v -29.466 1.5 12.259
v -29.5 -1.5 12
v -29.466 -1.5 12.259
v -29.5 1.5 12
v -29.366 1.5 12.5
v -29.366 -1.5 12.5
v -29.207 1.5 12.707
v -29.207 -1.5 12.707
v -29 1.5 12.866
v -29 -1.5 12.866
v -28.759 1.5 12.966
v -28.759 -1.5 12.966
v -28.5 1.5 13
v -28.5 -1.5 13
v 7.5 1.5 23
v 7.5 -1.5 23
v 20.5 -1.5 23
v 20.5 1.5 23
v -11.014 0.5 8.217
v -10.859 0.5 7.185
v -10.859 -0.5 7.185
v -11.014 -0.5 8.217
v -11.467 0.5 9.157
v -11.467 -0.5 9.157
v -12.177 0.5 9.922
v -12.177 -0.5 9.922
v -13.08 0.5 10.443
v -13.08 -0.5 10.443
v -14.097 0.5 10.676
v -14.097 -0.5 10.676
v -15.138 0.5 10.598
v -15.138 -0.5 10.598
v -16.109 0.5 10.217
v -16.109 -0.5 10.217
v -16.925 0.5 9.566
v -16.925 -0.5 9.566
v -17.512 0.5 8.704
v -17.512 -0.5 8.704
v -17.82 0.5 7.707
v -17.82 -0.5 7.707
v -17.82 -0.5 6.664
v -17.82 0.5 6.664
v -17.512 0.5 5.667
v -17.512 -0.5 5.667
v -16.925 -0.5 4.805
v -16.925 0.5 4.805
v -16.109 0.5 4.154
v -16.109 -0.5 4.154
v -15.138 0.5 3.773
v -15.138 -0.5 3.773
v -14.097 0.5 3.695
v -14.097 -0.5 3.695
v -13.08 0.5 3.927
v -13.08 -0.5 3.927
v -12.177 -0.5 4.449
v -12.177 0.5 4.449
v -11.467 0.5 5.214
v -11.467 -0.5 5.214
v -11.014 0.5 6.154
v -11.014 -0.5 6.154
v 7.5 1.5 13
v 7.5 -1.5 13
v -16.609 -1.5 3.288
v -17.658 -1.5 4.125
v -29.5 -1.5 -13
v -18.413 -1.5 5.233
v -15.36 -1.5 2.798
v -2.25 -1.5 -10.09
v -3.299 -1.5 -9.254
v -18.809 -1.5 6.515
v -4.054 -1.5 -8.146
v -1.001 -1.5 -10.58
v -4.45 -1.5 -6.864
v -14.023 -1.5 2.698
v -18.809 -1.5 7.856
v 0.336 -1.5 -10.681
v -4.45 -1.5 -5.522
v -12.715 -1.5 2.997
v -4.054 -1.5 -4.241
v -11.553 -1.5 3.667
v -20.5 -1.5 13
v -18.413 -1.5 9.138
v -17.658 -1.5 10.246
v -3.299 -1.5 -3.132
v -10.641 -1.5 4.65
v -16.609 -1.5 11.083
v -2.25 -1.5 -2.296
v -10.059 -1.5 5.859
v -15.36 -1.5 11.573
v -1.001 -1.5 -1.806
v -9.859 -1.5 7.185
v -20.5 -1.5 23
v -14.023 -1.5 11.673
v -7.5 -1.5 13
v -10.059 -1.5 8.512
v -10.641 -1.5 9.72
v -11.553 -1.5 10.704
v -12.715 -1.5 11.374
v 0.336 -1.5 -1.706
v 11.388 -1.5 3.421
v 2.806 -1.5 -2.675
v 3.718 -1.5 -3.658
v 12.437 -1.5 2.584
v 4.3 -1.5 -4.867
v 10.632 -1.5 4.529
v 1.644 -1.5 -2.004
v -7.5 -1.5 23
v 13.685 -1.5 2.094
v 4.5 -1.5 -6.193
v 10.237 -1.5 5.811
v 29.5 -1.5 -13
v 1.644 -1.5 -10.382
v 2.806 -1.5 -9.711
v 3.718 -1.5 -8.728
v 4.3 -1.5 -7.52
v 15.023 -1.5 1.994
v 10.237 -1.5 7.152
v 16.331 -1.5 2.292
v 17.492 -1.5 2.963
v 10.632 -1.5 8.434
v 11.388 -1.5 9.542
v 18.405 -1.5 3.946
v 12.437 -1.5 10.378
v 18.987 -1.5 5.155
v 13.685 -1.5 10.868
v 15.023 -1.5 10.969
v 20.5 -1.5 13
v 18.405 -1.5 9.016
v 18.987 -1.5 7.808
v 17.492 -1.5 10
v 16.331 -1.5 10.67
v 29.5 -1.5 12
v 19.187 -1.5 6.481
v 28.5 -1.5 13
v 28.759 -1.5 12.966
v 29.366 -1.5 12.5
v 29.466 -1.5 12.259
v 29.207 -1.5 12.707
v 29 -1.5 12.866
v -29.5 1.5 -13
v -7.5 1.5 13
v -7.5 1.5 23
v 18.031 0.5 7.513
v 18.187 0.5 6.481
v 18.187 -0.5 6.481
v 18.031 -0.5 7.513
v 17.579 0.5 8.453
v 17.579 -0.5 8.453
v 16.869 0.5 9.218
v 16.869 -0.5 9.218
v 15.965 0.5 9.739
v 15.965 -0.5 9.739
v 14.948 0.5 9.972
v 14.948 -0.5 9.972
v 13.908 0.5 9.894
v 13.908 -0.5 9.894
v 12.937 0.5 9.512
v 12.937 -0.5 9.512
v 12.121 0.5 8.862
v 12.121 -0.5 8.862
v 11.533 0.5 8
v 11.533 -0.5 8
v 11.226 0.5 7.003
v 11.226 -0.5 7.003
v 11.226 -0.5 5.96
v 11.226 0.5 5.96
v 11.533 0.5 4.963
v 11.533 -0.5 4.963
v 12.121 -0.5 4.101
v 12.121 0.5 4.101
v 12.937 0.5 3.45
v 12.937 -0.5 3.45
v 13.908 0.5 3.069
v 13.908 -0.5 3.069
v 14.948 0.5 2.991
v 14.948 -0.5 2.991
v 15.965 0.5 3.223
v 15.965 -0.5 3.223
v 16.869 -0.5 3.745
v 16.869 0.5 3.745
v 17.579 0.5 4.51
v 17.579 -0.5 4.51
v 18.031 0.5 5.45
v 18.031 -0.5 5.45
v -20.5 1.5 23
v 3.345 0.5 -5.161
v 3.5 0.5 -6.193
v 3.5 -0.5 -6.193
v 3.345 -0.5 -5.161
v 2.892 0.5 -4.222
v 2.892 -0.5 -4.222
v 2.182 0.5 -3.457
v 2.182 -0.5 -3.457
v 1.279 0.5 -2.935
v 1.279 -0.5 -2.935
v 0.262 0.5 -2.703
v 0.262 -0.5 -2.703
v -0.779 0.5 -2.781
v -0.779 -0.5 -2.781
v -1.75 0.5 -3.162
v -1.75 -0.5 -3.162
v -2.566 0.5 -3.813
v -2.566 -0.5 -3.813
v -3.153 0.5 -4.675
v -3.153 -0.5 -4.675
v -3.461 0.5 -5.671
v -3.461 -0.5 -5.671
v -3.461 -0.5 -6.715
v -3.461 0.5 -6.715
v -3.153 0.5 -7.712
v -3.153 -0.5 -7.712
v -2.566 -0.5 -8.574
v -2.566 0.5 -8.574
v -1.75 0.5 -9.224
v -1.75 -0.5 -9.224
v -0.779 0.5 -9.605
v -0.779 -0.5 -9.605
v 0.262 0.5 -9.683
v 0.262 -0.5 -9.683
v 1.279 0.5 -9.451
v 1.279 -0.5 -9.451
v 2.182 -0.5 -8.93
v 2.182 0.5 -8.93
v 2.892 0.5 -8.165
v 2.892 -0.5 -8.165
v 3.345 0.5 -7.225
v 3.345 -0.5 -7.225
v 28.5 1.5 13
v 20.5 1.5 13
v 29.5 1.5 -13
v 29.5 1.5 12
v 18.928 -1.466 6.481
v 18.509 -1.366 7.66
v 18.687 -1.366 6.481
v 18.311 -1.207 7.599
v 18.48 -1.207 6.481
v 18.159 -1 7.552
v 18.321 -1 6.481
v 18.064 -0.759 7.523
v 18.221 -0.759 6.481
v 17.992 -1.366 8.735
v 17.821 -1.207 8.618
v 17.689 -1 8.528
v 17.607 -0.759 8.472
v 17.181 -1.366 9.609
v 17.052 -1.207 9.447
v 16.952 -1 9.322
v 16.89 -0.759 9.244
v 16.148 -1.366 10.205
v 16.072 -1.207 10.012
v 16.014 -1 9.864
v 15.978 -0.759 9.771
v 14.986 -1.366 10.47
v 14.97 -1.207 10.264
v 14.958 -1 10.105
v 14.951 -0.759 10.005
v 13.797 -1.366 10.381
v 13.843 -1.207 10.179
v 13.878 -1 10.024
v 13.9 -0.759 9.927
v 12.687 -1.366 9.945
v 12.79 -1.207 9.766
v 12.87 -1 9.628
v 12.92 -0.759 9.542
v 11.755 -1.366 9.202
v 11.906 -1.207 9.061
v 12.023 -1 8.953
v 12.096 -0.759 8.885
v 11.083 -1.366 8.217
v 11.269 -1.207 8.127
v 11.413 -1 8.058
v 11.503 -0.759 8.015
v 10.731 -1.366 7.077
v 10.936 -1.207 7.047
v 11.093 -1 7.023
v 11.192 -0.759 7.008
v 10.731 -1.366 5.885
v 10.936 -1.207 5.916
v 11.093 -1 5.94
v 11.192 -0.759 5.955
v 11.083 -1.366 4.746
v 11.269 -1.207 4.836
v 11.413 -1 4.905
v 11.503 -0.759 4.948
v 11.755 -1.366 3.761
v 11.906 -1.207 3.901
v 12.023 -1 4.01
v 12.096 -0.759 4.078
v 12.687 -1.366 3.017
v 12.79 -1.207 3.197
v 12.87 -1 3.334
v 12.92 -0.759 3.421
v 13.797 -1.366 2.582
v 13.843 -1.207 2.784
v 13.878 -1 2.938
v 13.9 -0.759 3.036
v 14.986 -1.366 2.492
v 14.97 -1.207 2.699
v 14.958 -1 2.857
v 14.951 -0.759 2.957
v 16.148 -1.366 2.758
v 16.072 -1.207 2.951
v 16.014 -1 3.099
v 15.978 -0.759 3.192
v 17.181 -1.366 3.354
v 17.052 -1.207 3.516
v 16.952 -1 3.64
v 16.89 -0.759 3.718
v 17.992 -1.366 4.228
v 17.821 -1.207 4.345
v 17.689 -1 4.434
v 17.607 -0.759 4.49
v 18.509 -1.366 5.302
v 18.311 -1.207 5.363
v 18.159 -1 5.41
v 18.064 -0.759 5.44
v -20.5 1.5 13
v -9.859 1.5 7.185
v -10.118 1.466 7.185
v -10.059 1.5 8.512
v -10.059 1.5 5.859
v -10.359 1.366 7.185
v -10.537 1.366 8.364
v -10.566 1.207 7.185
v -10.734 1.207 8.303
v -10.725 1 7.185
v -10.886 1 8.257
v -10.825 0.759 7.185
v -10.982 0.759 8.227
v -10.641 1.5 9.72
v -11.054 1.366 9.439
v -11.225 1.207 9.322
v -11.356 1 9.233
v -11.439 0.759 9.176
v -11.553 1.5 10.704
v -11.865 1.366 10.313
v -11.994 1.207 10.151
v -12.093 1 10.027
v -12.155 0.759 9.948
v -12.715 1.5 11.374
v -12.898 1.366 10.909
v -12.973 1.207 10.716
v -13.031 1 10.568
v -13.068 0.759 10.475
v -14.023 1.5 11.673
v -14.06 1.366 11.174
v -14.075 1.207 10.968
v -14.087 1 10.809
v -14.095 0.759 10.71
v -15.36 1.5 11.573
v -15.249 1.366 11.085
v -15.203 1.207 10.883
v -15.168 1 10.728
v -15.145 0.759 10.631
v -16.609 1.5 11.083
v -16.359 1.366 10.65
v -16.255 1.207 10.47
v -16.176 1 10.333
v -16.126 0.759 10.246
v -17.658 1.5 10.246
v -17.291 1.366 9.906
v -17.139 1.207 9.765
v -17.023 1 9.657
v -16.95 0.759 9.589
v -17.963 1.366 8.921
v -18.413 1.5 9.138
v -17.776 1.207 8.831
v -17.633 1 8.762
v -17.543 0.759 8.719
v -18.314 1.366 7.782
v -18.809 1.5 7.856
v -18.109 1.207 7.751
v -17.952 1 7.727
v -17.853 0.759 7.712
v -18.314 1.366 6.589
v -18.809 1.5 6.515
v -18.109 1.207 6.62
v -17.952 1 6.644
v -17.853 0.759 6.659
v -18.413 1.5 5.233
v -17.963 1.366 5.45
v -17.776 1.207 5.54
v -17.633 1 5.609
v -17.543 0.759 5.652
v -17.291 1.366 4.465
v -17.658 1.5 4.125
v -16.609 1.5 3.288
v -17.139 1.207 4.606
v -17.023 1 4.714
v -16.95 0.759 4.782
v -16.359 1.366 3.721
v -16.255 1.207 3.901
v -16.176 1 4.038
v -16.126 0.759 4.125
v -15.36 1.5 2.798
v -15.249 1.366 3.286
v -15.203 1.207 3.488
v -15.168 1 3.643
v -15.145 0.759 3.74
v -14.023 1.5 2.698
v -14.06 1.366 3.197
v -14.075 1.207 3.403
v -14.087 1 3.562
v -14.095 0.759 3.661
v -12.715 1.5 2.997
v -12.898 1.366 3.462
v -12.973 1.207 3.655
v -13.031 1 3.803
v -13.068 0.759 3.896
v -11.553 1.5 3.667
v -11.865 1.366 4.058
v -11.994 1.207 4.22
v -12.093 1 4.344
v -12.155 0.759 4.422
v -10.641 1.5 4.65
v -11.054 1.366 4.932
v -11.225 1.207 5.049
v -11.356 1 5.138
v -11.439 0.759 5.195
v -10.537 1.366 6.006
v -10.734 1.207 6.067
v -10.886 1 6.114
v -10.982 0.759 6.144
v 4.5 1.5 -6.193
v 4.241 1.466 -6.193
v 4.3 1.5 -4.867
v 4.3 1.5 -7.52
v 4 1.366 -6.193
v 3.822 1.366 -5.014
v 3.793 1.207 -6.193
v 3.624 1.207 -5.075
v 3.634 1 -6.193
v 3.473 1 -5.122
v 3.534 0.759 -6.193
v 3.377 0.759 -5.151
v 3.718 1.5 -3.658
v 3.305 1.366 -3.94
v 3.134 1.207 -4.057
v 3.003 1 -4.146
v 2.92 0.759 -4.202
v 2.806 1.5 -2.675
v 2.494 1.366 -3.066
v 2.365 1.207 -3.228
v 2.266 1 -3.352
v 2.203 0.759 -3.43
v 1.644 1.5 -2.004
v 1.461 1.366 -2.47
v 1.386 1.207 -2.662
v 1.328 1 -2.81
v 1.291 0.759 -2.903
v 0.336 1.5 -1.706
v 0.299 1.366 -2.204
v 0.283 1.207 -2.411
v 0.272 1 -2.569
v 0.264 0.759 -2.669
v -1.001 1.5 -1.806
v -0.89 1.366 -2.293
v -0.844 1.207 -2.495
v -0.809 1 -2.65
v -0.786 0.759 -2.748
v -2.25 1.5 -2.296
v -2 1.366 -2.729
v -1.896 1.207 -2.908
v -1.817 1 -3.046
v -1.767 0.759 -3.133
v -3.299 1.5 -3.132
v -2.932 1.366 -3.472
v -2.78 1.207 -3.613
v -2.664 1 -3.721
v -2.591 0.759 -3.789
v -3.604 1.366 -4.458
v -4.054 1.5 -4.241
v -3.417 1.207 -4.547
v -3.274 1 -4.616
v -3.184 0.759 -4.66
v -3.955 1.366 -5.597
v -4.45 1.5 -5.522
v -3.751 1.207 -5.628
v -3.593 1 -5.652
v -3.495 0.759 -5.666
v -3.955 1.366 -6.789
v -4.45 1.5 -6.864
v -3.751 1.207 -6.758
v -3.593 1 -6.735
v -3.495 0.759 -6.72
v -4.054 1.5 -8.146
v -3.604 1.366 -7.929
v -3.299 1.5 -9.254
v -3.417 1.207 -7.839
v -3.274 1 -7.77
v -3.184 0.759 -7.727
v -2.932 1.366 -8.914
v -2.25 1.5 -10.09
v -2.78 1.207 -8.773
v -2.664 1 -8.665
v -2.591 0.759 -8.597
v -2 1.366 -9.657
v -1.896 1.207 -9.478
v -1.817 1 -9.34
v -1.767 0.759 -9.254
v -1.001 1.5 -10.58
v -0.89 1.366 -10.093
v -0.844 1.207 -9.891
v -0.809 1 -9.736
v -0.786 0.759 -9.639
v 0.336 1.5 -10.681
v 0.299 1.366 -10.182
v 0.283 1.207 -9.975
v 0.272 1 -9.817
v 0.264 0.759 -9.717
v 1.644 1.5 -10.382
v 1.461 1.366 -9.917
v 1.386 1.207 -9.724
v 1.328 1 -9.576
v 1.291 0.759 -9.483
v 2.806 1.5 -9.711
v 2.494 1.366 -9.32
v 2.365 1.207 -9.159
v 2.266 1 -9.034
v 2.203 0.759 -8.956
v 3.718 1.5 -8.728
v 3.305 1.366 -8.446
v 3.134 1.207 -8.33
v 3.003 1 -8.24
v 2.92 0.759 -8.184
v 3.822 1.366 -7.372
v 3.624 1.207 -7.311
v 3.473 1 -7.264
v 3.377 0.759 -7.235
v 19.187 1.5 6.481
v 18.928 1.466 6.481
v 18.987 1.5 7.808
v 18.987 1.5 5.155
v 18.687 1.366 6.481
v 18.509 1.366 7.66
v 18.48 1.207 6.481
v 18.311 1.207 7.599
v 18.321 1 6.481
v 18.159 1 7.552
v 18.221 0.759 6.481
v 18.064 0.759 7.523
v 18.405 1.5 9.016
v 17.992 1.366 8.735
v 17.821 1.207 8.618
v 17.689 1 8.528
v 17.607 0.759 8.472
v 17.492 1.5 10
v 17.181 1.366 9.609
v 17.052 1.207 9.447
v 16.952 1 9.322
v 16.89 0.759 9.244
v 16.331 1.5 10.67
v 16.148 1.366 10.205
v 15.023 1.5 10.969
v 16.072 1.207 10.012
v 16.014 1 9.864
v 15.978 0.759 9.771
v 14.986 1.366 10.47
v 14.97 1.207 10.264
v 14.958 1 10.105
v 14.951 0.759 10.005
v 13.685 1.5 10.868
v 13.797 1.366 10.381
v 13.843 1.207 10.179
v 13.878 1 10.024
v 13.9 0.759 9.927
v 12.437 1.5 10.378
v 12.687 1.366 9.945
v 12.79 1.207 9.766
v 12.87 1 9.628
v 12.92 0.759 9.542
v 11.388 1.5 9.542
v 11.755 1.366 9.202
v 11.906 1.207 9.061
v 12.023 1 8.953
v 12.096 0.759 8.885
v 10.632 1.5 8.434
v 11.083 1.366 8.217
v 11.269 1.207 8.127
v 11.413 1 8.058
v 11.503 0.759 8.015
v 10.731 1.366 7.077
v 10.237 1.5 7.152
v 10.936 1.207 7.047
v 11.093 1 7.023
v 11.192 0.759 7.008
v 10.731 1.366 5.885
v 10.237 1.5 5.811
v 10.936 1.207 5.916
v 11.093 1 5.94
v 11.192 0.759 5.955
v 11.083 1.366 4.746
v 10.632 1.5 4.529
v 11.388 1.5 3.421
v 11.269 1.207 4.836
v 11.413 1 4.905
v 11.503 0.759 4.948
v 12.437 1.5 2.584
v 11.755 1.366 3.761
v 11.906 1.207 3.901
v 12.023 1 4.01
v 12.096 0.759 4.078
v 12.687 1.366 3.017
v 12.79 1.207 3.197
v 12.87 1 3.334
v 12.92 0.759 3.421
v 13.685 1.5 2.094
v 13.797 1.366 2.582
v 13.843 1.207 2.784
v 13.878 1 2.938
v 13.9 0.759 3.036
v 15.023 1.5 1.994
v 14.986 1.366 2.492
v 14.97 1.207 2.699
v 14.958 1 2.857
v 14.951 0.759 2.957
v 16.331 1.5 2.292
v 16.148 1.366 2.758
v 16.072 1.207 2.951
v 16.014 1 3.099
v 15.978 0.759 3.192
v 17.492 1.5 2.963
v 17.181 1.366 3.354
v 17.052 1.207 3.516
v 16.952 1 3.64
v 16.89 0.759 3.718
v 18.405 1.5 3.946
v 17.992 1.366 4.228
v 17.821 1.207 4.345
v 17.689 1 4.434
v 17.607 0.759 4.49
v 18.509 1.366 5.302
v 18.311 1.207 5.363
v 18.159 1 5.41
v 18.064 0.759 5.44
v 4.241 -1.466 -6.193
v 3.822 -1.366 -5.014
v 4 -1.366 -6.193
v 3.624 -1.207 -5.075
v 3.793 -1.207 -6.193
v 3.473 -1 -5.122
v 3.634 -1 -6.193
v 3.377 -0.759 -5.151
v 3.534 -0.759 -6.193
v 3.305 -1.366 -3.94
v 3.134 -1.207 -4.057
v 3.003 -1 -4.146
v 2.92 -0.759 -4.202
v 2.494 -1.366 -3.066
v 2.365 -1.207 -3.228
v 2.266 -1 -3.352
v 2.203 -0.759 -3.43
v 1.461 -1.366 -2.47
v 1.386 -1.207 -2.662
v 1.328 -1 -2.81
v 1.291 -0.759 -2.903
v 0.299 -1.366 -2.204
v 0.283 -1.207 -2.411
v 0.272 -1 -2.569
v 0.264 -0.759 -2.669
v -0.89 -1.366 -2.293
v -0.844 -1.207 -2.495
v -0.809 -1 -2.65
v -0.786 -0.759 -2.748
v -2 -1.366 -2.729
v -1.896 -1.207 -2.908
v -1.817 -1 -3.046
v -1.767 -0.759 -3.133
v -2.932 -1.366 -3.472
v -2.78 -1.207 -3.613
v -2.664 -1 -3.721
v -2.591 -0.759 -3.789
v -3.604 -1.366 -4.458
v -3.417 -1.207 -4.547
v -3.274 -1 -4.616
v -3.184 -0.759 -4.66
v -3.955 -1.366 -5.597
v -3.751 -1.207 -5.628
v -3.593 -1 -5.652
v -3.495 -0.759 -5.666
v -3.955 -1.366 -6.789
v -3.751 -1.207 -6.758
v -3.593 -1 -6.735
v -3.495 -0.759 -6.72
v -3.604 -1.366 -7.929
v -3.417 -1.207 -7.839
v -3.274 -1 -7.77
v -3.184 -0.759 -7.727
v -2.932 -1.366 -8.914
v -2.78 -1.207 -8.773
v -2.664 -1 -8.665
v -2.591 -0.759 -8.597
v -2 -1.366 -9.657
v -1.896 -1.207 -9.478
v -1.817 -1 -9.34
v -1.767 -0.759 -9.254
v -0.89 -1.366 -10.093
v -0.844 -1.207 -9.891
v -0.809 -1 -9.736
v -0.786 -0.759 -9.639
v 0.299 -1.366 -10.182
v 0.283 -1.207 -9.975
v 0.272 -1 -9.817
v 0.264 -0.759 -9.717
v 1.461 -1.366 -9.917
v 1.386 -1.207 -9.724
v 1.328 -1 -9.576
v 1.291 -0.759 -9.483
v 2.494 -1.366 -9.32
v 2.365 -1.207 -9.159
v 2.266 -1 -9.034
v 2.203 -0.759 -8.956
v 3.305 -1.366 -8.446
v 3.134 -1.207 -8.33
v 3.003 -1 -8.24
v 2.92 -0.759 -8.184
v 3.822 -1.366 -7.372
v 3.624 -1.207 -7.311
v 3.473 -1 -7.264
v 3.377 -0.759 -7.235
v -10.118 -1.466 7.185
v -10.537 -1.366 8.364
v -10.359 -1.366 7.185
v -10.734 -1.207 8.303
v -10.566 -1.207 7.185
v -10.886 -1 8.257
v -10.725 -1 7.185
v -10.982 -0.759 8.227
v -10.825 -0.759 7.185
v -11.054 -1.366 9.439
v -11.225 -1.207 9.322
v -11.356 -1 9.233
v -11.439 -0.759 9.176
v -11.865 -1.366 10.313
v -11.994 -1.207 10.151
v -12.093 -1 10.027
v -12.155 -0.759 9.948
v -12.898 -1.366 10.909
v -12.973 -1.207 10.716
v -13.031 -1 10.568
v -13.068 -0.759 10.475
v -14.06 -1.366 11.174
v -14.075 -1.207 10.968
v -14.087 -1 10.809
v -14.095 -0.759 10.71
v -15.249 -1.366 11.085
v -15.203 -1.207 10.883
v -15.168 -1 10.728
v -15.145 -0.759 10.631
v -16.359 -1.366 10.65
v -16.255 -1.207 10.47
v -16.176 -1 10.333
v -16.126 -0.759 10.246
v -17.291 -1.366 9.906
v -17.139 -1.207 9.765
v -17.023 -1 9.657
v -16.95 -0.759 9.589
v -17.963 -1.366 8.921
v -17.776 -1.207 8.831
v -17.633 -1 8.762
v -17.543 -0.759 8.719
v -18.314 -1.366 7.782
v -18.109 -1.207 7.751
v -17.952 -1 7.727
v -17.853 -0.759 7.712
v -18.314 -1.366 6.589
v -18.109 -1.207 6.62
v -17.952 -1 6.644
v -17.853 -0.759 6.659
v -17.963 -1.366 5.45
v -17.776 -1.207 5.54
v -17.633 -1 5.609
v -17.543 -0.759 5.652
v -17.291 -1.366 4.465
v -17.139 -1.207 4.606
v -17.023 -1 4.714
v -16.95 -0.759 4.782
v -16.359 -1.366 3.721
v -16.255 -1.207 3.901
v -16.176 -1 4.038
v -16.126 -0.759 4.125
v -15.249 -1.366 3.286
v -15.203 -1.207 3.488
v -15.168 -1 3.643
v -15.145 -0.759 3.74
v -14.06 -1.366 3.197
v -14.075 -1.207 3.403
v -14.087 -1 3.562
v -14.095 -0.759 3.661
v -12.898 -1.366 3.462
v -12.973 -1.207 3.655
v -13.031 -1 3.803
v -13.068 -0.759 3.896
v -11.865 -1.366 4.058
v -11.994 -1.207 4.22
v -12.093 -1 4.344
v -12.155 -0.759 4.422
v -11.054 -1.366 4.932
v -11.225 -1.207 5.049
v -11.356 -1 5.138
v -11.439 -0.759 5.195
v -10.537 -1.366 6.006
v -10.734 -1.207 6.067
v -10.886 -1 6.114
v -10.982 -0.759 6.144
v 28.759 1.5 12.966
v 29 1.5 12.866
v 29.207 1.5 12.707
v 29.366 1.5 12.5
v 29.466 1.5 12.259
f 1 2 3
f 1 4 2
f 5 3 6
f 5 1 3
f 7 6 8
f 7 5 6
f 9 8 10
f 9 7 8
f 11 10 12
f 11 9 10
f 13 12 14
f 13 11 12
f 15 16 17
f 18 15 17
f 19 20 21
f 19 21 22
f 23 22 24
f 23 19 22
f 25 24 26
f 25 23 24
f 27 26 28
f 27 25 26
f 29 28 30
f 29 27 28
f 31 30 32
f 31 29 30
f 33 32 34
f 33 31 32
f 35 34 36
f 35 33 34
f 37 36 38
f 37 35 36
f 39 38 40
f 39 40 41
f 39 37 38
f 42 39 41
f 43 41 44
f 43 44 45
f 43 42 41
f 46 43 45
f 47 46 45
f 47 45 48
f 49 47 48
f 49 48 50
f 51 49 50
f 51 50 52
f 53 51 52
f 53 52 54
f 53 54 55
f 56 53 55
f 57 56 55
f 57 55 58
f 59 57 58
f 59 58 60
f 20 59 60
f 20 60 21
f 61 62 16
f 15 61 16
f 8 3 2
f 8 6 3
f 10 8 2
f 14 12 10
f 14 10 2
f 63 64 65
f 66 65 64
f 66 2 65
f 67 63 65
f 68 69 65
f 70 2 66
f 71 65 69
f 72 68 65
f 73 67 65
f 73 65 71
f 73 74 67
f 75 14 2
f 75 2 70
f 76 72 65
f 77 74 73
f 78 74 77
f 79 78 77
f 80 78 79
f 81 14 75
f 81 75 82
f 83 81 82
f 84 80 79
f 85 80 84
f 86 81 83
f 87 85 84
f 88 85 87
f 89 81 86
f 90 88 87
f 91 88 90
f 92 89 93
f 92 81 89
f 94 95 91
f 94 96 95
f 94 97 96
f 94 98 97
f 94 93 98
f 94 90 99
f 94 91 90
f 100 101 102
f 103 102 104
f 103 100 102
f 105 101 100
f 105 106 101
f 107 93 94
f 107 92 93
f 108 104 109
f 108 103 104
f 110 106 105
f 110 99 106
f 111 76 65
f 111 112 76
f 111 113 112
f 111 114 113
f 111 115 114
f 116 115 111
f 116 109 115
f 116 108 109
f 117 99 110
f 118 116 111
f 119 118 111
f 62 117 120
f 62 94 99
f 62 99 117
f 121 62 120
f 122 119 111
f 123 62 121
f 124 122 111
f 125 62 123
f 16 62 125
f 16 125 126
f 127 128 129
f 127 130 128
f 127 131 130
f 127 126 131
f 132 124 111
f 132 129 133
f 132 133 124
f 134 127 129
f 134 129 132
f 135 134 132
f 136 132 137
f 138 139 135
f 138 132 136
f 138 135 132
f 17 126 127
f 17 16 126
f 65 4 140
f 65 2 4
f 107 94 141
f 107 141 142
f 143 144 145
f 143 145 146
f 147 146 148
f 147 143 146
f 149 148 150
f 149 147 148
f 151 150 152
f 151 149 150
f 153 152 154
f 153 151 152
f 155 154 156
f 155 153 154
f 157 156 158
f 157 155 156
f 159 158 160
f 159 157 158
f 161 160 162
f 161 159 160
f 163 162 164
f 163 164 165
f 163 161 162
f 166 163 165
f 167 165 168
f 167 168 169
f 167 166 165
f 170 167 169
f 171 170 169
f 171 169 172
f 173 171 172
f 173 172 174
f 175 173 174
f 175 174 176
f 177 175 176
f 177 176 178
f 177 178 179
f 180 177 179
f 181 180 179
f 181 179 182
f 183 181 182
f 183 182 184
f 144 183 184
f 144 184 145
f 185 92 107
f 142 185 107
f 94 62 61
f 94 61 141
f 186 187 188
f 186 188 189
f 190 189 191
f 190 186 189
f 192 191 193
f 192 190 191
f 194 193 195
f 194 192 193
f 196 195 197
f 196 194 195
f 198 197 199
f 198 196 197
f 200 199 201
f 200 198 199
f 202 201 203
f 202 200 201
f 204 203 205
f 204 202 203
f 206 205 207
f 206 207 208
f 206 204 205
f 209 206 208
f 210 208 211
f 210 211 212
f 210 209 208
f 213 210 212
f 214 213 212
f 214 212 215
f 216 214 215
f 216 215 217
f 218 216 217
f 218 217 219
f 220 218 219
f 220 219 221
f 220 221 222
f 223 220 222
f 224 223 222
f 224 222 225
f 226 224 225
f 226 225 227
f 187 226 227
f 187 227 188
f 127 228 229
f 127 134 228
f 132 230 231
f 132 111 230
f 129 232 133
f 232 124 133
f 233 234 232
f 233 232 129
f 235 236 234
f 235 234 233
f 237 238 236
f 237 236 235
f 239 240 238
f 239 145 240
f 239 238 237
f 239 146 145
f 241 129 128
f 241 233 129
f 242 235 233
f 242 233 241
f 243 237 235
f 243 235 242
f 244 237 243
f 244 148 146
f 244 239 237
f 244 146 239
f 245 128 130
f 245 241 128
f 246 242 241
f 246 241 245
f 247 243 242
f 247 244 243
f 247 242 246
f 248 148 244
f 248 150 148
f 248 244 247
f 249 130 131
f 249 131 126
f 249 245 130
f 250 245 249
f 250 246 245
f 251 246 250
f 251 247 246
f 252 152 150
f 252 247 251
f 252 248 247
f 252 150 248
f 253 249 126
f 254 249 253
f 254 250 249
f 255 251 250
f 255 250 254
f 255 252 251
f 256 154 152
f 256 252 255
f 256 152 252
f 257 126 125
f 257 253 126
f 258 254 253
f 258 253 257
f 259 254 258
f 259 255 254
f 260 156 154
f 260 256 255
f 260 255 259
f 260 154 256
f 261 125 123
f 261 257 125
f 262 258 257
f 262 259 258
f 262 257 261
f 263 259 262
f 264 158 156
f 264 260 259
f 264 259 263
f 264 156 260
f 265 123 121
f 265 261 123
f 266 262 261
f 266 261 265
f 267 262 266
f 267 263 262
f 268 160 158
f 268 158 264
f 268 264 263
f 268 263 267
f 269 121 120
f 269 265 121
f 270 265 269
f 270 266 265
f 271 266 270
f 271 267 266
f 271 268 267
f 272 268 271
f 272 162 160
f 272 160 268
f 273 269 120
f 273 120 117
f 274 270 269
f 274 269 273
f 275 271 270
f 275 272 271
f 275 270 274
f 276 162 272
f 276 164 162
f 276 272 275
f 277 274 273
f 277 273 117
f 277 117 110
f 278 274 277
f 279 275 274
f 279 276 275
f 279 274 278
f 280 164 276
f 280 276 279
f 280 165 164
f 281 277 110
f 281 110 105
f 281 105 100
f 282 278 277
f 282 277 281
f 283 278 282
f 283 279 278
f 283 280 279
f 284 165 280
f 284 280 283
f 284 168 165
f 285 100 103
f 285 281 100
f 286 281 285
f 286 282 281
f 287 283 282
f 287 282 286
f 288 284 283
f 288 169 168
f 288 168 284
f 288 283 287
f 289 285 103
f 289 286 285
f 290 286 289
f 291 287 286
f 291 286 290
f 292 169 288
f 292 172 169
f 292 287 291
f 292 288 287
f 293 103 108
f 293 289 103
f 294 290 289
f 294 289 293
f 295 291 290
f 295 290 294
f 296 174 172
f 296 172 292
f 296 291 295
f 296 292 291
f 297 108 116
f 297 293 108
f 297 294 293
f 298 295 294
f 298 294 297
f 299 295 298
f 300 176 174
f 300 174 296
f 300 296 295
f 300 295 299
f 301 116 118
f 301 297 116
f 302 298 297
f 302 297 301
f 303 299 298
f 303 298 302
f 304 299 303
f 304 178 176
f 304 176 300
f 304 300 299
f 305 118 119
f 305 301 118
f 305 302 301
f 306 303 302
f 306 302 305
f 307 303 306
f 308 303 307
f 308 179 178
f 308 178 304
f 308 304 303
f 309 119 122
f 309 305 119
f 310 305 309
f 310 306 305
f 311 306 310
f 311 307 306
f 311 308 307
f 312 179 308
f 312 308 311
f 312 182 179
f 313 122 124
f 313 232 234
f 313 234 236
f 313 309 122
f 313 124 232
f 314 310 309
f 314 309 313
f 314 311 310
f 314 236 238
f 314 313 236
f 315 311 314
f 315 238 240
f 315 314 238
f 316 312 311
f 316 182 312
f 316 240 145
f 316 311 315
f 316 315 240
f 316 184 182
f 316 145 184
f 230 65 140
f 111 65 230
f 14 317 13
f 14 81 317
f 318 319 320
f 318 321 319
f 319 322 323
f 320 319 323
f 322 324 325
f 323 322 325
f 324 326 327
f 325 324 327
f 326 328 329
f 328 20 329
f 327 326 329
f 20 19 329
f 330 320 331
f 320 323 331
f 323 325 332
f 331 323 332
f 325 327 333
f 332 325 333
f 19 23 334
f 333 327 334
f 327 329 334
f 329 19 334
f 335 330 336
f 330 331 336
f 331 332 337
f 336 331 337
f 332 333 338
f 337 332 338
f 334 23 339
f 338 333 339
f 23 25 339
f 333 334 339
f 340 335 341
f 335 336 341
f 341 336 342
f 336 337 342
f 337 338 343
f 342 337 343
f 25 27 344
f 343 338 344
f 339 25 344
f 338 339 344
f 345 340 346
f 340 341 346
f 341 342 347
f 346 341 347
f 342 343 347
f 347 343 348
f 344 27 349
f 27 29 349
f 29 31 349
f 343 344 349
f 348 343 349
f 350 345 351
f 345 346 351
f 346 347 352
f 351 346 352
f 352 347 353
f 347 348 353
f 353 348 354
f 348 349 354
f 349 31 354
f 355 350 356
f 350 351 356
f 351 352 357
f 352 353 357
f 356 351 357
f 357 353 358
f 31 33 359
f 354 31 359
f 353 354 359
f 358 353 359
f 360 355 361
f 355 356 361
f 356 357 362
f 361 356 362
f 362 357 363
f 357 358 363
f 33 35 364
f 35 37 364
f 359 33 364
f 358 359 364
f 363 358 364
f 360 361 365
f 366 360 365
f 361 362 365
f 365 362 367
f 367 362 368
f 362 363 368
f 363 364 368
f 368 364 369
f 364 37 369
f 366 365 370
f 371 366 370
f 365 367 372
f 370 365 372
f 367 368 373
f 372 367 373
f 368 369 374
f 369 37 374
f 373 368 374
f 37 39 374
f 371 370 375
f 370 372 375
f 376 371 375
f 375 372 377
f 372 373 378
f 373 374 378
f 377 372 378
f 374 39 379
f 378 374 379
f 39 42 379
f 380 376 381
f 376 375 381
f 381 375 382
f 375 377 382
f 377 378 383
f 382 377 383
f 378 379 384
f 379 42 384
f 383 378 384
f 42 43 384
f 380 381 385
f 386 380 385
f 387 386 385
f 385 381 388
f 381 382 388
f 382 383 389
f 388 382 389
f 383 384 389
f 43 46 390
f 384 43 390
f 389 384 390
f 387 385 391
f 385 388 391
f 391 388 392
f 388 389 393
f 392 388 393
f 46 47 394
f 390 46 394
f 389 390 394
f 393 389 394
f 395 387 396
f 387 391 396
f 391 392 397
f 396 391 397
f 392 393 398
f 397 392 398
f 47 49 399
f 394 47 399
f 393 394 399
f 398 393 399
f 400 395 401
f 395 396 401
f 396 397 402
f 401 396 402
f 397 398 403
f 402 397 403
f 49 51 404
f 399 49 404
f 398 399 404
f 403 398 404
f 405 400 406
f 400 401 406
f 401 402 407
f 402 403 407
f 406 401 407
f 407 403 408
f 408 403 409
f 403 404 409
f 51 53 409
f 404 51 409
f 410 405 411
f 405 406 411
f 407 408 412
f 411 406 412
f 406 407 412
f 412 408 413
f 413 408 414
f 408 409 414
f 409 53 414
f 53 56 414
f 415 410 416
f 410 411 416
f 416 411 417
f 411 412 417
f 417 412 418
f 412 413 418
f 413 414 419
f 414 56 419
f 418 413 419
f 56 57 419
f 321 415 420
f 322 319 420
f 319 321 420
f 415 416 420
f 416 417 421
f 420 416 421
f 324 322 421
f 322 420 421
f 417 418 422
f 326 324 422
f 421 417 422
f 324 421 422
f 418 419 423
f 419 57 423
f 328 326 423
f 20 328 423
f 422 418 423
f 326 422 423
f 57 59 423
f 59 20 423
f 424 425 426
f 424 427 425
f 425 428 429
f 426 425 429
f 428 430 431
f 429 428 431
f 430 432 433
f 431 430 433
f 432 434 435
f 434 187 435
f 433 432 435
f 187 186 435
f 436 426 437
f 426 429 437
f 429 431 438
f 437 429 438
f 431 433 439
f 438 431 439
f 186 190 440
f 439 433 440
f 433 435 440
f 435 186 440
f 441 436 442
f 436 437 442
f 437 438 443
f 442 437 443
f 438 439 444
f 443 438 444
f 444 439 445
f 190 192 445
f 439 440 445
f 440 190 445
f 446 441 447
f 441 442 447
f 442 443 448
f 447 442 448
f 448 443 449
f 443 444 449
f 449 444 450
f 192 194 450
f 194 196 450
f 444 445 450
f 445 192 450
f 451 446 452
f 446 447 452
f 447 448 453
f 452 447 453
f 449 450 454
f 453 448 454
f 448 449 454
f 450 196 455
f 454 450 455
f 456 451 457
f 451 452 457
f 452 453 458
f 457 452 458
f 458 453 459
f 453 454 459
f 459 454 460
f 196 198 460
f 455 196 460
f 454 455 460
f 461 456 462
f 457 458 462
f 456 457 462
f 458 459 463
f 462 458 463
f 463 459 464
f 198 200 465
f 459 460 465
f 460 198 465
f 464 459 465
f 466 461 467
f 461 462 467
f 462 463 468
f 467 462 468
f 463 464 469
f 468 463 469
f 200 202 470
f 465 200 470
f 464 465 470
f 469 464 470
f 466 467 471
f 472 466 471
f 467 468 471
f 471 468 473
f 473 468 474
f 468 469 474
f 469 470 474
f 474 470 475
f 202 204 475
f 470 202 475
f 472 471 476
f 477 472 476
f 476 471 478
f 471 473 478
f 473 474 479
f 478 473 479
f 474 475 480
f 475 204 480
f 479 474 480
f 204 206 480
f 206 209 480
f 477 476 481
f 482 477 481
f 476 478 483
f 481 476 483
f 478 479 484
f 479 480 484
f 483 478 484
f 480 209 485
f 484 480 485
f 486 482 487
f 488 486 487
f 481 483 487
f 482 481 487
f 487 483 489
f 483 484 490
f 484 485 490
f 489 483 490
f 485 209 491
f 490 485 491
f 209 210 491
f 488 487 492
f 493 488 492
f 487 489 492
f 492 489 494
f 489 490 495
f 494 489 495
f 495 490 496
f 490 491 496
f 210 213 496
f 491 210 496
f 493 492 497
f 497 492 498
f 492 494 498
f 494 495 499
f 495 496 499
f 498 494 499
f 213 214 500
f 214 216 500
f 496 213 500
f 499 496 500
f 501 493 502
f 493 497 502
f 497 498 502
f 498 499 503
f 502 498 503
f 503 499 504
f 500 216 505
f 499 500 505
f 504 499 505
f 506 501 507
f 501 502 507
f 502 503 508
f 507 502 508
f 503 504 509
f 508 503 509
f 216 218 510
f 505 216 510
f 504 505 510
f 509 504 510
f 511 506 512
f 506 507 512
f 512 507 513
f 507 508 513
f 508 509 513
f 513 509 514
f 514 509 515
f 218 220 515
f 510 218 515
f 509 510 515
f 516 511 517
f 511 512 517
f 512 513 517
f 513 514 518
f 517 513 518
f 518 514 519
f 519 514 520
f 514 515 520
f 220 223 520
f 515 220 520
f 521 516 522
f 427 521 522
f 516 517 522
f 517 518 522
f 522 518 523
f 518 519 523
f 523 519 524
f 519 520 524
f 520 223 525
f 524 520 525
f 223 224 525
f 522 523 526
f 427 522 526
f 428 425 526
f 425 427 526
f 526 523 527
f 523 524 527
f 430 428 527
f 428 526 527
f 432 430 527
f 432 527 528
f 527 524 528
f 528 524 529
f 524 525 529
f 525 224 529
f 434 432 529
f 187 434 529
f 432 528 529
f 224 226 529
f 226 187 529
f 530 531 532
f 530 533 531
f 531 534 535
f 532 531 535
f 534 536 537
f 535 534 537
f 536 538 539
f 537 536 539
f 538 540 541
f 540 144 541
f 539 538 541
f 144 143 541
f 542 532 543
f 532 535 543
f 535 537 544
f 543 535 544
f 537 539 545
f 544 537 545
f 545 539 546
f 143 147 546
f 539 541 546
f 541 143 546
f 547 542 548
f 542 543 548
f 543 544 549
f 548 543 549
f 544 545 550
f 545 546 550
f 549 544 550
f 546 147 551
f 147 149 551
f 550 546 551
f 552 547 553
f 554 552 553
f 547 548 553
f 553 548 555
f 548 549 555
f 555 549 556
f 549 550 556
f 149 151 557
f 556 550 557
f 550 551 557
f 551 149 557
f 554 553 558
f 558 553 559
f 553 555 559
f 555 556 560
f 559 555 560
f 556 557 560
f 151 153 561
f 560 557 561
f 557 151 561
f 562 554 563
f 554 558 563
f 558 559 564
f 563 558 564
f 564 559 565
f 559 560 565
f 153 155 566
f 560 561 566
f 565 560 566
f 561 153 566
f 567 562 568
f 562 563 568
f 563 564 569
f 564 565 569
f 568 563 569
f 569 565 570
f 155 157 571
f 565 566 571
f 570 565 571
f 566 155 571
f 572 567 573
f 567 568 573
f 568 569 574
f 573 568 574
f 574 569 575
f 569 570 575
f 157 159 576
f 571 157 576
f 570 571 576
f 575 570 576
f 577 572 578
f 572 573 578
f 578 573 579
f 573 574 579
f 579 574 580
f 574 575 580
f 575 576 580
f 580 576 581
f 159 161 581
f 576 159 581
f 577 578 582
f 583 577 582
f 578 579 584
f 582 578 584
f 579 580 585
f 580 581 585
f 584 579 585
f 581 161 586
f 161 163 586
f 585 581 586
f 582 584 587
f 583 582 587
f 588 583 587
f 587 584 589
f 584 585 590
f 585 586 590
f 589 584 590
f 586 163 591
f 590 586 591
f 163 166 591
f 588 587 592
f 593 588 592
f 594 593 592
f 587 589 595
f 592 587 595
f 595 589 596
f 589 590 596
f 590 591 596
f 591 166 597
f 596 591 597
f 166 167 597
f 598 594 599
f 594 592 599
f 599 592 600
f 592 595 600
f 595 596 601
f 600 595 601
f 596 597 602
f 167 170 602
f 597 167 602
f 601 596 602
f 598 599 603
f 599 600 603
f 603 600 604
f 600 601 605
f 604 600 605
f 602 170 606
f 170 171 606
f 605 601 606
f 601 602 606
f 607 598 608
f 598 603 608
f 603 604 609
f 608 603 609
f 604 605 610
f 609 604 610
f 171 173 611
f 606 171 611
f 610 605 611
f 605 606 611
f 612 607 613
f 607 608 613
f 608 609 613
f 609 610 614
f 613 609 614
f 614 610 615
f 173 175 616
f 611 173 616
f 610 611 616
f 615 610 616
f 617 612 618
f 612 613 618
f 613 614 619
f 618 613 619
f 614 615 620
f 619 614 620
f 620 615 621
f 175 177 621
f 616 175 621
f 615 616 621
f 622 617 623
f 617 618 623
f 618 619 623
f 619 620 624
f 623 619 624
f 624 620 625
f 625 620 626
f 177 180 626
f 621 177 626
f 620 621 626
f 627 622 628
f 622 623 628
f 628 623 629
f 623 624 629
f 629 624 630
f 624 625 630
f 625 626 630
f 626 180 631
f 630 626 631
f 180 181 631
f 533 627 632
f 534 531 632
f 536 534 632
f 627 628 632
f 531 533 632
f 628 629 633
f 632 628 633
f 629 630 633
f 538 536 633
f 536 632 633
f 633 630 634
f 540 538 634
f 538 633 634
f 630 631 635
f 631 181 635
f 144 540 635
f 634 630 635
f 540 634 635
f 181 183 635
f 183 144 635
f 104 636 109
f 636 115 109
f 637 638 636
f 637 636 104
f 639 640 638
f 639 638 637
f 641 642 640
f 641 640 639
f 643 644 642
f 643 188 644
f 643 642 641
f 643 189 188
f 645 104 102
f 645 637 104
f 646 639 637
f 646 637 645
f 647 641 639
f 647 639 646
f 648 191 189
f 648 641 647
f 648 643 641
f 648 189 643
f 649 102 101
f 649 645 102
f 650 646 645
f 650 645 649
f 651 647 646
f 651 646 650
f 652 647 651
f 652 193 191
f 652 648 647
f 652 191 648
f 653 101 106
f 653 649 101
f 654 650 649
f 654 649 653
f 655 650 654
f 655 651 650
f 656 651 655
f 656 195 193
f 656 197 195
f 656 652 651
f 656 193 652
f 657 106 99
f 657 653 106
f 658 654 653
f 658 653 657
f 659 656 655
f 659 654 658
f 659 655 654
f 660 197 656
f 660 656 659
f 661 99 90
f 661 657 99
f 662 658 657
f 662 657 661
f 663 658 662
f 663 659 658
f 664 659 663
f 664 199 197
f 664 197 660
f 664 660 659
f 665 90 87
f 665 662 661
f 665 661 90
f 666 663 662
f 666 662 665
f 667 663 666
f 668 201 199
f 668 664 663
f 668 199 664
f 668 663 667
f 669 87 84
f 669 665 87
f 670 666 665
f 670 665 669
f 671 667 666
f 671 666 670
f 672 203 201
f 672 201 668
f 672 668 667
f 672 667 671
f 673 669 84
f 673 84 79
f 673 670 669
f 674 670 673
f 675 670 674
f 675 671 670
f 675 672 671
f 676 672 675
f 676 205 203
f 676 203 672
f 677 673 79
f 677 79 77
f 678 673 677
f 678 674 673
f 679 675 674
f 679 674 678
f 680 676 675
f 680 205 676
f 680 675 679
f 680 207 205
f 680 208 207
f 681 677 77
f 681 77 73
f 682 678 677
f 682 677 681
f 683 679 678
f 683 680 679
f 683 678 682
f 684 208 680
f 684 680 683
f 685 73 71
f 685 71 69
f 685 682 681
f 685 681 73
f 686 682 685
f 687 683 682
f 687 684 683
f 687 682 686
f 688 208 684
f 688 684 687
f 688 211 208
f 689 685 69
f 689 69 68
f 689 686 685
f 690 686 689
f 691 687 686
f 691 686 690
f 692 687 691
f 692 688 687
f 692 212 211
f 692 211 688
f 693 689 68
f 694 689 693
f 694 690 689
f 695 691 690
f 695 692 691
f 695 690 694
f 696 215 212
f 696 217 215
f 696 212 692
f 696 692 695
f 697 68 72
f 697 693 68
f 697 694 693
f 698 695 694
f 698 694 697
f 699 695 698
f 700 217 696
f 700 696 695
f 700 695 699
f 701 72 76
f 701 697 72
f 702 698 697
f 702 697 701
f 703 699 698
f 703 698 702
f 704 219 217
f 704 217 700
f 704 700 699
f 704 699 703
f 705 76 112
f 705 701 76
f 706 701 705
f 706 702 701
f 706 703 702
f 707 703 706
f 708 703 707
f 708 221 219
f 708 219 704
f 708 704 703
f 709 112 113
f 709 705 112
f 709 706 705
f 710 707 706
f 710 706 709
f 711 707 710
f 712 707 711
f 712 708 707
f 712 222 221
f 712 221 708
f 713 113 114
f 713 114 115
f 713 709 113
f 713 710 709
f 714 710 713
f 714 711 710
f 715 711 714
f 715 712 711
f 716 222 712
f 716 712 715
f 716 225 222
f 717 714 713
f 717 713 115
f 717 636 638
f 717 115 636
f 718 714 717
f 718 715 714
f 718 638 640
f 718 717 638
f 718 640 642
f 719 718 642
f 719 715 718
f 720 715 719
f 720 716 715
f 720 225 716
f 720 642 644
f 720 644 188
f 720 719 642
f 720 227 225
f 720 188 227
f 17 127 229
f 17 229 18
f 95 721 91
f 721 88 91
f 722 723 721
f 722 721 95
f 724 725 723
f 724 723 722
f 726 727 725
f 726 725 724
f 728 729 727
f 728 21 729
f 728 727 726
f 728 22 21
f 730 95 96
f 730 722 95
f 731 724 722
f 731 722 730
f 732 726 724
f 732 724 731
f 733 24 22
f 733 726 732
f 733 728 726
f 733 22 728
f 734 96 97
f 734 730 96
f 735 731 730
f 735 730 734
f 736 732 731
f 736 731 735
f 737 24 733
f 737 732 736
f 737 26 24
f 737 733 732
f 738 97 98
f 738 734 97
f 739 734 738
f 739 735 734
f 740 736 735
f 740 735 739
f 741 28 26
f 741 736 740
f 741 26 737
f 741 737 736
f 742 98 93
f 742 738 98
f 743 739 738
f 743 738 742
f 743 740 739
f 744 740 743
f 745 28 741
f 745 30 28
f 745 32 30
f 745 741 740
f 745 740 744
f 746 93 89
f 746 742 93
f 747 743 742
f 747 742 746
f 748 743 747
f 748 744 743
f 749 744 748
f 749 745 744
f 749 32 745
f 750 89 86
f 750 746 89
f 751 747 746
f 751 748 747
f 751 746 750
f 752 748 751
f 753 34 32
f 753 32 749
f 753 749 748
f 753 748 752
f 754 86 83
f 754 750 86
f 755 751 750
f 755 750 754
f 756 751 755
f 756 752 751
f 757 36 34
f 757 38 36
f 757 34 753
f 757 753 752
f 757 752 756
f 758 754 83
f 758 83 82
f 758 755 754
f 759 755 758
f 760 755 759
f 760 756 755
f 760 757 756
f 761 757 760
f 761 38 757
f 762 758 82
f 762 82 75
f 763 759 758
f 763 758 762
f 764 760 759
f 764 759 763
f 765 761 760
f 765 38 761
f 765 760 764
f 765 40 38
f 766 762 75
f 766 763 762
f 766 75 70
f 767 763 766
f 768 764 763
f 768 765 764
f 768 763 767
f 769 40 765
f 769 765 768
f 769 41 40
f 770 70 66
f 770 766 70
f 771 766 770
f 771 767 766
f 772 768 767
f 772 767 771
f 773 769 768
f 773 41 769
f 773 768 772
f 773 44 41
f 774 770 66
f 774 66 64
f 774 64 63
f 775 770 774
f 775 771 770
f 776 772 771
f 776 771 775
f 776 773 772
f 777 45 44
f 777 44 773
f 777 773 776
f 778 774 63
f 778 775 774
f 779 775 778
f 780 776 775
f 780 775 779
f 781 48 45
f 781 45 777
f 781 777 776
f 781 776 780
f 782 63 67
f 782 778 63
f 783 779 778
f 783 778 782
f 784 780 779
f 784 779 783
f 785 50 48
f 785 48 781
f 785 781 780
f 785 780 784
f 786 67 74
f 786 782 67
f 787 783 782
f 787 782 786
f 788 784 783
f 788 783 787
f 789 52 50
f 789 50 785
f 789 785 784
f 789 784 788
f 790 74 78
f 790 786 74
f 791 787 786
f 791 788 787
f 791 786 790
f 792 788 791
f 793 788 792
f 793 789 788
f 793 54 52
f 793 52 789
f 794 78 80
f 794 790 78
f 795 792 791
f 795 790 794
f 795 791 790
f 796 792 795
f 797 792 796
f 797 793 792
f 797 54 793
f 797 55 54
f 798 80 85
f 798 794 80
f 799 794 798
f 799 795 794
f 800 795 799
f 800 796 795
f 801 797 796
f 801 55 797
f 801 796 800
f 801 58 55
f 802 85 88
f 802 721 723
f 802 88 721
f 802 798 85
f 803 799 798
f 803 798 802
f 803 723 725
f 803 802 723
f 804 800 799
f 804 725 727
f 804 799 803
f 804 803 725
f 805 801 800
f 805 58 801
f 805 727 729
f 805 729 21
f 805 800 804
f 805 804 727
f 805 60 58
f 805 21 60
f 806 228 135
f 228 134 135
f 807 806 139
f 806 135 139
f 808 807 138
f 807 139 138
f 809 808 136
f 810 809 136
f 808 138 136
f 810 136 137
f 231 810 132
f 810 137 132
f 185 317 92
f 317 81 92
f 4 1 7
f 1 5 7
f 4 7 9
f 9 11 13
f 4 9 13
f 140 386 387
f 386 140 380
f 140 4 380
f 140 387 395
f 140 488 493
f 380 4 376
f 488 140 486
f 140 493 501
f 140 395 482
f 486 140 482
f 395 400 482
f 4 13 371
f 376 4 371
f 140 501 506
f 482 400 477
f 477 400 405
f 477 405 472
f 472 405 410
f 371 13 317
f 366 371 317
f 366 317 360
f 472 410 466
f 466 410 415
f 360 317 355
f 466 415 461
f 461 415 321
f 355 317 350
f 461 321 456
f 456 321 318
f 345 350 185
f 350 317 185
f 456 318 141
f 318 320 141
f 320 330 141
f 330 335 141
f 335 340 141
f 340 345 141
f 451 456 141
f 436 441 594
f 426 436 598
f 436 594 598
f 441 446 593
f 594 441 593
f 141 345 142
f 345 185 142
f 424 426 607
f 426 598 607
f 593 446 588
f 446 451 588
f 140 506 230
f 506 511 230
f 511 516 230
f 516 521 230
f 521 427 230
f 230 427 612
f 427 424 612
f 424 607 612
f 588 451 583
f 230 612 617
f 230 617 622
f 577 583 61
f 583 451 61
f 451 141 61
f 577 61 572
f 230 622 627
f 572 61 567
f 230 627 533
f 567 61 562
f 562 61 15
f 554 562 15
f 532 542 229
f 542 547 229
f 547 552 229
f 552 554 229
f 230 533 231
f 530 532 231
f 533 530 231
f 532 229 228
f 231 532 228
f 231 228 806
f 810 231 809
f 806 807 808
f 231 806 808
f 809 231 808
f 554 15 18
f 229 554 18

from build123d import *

# Parameters (mm, degrees)
F0_R     = 3.5
F0_W     = 13
F0_H     = 10
F1_DEPTH = 1.5
F2_R     = 1
F3_R     = 1


with BuildPart() as f1:
    # F0 (on Front) → F1 (new body, symmetric)
    with BuildSketch(Plane.XZ):
        Polygon((-29.5, -13), (29.5, -13), (29.5, 13), (20.5, 13), (7.5, 13), (-7.5, 13), (-20.5, 13), (-29.5, 13), align=None)
        with Locations((0, -6.193141)):
            Circle(F0_R, mode=Mode.SUBTRACT)
        with Locations((-14.358868, 7.18544)):
            Circle(F0_R, mode=Mode.SUBTRACT)
        with Locations((14.686735, 6.481303)):
            Circle(F0_R, mode=Mode.SUBTRACT)
        with Locations((14, 18)):
            Rectangle(F0_W, F0_H)
        with Locations((-14, 18)):
            Rectangle(F0_W, F0_H)
    extrude(amount=F1_DEPTH, both=True)

    # F2
    f2_edges = [f1.edges().sort_by_distance(p)[0] for p in [
        (-29.5, 0, 13),
        (29.5, 0, 13),
        (-17.858868, -1.5, 7.18544),
        (11.186735, -1.5, 6.481303),
        (-3.5, -1.5, -6.193141),
    ]]
    fillet(f2_edges, radius=F2_R)

    # F3
    f3_edges = [f1.edges().sort_by_distance(p)[0] for p in [
        (11.186735, 1.5, 6.481303),
        (-17.858868, 1.5, 7.18544),
        (-3.5, 1.5, -6.193141),
    ]]
    fillet(f3_edges, radius=F3_R)


solid = f1.part
